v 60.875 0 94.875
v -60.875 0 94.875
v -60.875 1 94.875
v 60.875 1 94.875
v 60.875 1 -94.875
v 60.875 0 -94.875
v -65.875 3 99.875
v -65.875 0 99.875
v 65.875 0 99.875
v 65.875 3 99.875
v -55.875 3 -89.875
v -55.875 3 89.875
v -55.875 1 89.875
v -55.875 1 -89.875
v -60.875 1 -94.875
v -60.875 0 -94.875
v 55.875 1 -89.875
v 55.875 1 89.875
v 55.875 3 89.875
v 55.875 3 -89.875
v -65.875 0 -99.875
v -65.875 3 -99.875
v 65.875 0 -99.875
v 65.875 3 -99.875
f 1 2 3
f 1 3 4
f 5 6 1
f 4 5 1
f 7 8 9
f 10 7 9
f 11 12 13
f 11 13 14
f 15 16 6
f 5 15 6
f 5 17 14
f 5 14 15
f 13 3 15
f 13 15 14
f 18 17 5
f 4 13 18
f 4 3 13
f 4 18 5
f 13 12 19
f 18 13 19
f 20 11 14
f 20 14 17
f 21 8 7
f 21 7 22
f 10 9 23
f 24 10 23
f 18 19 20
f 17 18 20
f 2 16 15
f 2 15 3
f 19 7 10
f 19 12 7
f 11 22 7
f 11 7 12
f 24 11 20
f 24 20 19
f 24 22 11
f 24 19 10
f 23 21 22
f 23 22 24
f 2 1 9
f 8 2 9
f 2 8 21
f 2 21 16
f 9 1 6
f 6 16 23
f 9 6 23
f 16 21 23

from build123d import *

# Parameters (mm, degrees)
SKETCH_1_W          = 131.75
SKETCH_1_H          = 199.75
EXTRUDE_1_DEPTH     = 3
SKETCH_2_W          = 111.75
SKETCH_2_H          = 179.75
CUT_EXTRUDE_1_DEPTH = 6
SKETCH_3_W          = 121.75
SKETCH_3_H          = 189.75
CUT_EXTRUDE_2_DEPTH = 1


with BuildPart() as part:
    # Эскиз1 → Бобышка-Вытянуть1 (new body)
    with BuildSketch(Plane(origin=(0, 0, 0), x_dir=(1, 0, 0), z_dir=(0, 1, 0))):
        Rectangle(SKETCH_1_W, SKETCH_1_H)
    extrude(amount=EXTRUDE_1_DEPTH)

    # Эскиз2 → Вырез-Вытянуть1 (cut)
    with BuildSketch(Plane(origin=(0, 3, 0), x_dir=(1, 0, 0), z_dir=(0, 1, 0))):
        Rectangle(SKETCH_2_W, SKETCH_2_H)
    extrude(amount=-CUT_EXTRUDE_1_DEPTH, mode=Mode.SUBTRACT)

    # Эскиз3 → Вырез-Вытянуть2 (cut)
    with BuildSketch(Plane.XZ):
        Rectangle(SKETCH_3_W, SKETCH_3_H)
    extrude(amount=-CUT_EXTRUDE_2_DEPTH, mode=Mode.SUBTRACT)


solid = part.part
